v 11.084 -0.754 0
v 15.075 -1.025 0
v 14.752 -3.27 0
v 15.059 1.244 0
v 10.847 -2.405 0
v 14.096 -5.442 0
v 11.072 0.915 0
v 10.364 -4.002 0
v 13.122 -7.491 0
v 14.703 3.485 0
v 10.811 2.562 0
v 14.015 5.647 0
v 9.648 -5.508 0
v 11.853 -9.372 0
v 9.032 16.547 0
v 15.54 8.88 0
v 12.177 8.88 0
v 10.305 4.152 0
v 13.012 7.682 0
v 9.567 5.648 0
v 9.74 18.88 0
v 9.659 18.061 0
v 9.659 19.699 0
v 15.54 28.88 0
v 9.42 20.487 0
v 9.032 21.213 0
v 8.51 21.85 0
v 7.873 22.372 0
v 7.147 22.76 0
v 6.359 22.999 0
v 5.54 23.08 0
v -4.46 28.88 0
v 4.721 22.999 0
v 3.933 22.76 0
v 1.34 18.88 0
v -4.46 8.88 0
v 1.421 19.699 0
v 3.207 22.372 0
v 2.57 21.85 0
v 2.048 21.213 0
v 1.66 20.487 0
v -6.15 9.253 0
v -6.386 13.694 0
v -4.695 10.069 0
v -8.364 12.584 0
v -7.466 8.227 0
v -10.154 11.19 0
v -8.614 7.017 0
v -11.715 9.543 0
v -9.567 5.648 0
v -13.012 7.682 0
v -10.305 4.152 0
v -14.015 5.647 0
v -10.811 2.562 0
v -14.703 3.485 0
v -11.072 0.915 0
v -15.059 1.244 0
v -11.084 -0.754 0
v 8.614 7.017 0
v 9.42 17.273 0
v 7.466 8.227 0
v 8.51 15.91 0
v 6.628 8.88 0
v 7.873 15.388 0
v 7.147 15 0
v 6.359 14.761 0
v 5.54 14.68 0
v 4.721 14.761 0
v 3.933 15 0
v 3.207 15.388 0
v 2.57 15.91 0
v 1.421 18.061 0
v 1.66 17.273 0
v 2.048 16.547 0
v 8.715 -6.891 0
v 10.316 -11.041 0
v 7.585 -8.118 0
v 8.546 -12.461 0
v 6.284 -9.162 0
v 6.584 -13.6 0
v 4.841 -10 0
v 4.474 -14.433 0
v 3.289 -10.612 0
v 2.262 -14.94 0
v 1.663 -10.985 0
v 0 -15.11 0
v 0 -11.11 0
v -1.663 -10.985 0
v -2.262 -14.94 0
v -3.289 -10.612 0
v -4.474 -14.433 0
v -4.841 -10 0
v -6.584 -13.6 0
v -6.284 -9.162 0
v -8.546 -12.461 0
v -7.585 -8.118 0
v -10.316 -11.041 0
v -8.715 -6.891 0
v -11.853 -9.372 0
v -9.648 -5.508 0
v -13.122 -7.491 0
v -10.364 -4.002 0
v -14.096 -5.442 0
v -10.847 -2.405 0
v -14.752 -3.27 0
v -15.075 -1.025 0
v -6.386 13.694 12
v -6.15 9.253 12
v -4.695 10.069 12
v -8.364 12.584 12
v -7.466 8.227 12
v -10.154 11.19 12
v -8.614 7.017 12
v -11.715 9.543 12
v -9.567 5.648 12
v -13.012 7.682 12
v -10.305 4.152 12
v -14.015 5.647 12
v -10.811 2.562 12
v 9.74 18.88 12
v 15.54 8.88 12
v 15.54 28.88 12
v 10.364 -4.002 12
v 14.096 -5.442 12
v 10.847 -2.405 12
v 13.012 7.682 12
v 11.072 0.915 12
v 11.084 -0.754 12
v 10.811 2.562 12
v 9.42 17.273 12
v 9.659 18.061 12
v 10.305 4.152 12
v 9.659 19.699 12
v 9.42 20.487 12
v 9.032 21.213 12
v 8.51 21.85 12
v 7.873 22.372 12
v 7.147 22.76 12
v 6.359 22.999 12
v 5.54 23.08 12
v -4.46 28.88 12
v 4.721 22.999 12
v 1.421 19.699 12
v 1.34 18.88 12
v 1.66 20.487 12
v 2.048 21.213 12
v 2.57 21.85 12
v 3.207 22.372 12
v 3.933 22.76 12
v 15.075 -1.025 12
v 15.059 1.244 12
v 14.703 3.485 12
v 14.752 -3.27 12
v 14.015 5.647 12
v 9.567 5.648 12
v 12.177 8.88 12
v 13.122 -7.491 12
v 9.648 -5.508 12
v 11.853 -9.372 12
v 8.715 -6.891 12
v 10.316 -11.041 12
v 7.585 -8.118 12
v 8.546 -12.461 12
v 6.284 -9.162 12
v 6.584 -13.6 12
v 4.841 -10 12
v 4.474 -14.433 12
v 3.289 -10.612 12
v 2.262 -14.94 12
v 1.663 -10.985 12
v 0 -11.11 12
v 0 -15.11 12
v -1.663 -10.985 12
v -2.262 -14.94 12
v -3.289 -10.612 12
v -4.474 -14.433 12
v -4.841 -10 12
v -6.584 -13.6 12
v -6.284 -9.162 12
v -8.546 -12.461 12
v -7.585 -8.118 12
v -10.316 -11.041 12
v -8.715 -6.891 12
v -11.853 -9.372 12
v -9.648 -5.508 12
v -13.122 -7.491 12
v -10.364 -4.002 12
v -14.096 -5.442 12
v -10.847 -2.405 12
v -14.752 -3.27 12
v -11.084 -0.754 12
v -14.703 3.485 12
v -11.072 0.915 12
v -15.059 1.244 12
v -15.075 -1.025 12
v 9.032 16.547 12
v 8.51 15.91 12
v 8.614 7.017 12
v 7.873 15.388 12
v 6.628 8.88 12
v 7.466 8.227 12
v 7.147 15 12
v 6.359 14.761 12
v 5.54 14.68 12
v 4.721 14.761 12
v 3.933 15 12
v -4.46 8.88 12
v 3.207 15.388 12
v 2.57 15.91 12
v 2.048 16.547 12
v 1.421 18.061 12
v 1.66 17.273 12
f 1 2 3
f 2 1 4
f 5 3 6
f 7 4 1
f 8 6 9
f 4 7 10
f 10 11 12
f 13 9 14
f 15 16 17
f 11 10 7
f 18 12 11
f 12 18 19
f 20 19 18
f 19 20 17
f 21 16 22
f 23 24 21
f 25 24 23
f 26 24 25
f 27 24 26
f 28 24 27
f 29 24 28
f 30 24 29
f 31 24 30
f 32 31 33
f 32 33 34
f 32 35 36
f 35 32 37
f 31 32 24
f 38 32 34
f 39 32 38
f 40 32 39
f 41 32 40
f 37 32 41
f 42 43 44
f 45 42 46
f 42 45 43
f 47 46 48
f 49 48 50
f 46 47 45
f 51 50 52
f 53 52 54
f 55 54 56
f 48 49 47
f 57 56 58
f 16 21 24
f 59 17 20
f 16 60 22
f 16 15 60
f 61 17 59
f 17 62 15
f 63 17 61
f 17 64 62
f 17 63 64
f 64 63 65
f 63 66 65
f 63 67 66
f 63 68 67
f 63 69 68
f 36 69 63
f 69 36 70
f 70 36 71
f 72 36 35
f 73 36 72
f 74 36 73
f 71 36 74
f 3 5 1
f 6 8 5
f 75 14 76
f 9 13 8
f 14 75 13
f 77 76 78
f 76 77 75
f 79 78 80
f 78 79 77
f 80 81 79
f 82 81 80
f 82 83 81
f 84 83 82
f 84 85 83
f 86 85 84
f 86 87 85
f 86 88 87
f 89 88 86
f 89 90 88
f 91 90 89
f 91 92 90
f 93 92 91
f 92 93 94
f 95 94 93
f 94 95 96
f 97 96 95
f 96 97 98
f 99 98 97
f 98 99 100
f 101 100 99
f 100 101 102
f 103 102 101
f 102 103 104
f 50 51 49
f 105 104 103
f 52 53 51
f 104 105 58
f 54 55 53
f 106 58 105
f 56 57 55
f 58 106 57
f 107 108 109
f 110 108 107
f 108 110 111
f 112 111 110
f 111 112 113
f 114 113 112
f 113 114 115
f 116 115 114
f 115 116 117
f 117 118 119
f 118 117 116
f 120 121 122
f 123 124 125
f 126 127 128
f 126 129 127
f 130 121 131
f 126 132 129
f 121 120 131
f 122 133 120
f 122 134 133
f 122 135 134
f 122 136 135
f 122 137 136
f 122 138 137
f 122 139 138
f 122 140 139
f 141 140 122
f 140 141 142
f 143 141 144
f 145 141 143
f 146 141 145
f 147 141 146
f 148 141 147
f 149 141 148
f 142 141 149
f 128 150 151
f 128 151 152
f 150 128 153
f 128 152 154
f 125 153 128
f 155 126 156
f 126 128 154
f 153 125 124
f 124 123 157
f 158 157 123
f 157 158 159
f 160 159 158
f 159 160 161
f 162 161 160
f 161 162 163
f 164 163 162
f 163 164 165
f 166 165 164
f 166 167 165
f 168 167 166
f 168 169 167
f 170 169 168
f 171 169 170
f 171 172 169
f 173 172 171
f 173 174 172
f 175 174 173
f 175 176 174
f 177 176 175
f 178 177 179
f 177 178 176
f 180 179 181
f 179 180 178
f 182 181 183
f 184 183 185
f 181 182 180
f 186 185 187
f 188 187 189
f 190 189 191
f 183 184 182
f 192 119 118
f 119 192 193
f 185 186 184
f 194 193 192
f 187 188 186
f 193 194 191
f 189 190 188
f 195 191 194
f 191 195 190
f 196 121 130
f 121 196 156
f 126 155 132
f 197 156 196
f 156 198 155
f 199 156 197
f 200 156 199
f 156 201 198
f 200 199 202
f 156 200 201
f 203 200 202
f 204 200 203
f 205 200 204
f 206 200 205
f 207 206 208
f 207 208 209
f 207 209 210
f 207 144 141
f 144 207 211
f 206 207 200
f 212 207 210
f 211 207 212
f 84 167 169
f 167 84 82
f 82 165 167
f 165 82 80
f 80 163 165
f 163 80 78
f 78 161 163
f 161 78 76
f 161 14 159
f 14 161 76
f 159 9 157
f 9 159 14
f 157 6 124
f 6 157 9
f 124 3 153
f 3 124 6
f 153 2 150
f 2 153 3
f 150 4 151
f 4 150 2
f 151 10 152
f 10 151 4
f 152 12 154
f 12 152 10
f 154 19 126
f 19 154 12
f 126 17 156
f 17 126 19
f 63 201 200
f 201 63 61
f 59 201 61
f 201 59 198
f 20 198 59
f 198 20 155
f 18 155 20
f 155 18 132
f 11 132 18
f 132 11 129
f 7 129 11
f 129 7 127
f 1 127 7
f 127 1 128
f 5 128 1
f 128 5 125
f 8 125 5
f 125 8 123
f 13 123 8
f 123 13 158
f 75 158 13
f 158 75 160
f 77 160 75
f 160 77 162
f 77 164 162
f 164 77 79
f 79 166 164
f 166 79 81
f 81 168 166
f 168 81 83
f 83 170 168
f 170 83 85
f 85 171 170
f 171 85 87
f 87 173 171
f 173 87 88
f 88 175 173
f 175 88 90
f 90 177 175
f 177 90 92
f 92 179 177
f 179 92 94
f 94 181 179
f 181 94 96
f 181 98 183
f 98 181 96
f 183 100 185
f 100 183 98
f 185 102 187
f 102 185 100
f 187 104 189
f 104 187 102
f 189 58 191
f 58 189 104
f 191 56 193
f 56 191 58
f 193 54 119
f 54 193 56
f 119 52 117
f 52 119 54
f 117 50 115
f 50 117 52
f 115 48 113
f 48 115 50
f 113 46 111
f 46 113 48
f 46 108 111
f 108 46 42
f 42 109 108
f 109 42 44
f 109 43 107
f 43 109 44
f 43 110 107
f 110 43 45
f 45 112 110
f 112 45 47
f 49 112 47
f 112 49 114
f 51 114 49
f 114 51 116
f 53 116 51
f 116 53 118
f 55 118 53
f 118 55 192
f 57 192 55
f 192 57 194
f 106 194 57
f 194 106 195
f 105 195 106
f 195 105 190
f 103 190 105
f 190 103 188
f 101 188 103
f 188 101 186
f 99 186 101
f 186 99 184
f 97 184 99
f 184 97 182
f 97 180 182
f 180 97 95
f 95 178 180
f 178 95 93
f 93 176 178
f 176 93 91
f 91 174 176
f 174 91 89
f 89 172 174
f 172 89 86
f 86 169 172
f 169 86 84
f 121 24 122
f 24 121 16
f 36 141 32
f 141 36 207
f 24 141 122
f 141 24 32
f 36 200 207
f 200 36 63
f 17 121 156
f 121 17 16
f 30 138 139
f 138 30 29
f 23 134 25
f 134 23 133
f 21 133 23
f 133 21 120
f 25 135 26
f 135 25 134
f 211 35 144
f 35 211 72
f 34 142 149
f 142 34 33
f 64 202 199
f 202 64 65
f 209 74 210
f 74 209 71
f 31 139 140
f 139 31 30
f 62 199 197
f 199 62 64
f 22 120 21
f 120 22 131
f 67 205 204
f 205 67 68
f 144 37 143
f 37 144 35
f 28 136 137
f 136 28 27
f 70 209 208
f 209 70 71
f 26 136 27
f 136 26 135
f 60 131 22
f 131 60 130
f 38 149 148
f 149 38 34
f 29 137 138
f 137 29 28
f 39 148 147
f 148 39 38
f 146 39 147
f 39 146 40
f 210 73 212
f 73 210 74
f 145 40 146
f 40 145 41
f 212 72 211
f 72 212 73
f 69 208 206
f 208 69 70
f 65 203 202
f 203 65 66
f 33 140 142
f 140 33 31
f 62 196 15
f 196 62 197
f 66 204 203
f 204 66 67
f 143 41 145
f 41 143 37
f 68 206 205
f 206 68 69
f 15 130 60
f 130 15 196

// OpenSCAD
$fn = 32;

// ----------------------------------------------------------------------
// Pipe clamp: 30.22 mm ring, 4 mm wall, 12 mm wide
// ----------------------------------------------------------------------

// --- parameters (mm) ---
outer_r = 15.11;          // clamp outside radius
inner_r = 11.11;          // pipe bore radius
band = 4;                 // band thickness
clamp_w = 12;             // clamp width
opening = 50;             // opening angle between the ends
lug_w = 20;               // lug width
lug_len = 20;             // lug length
bolt_d = 8.4;             // bolt hole

clamp_profile = [[-6.386, 13.694], [-8.364, 12.584], [-10.154, 11.19], [-11.715, 9.543], [-13.012, 7.682], [-14.015, 5.647], [-14.703, 3.485], [-15.059, 1.244], [-15.075, -1.025], [-14.752, -3.27], [-14.096, -5.442], [-13.122, -7.491], [-11.853, -9.372], [-10.316, -11.041], [-8.546, -12.461], [-6.584, -13.6], [-4.474, -14.433], [-2.262, -14.94], [0, -15.11], [2.262, -14.94], [4.474, -14.433], [6.584, -13.6], [8.546, -12.461], [10.316, -11.041], [11.853, -9.372], [13.122, -7.491], [14.096, -5.442], [14.752, -3.27], [15.075, -1.025], [15.059, 1.244], [14.703, 3.485], [14.015, 5.647], [13.012, 7.682], [11.715, 9.543], [10.154, 11.19], [8.364, 12.584], [6.386, 13.694], [4.695, 10.069], [6.15, 9.253], [7.466, 8.227], [8.614, 7.017], [9.567, 5.648], [10.305, 4.152], [10.811, 2.562], [11.072, 0.915], [11.084, -0.754], [10.847, -2.405], [10.364, -4.002], [9.648, -5.508], [8.715, -6.891], [7.585, -8.118], [6.284, -9.162], [4.841, -10], [3.289, -10.612], [1.663, -10.985], [0, -11.11], [-1.663, -10.985], [-3.289, -10.612], [-4.841, -10], [-6.284, -9.162], [-7.585, -8.118], [-8.715, -6.891], [-9.648, -5.508], [-10.364, -4.002], [-10.847, -2.405], [-11.084, -0.754], [-11.072, 0.915], [-10.811, 2.562], [-10.305, 4.152], [-9.567, 5.648], [-8.614, 7.017], [-7.466, 8.227], [-6.15, 9.253], [-4.695, 10.069]];

difference() {
  union() {
    linear_extrude(height = clamp_w) polygon(clamp_profile);
    /* bolt lug on the other end */
    translate([-4.46, 8.88, 0]) cube([lug_w, 20, clamp_w]);
  }
  translate([5.54, 18.88, -2.5]) cylinder(h = clamp_w + 5, d = bolt_d);
}
